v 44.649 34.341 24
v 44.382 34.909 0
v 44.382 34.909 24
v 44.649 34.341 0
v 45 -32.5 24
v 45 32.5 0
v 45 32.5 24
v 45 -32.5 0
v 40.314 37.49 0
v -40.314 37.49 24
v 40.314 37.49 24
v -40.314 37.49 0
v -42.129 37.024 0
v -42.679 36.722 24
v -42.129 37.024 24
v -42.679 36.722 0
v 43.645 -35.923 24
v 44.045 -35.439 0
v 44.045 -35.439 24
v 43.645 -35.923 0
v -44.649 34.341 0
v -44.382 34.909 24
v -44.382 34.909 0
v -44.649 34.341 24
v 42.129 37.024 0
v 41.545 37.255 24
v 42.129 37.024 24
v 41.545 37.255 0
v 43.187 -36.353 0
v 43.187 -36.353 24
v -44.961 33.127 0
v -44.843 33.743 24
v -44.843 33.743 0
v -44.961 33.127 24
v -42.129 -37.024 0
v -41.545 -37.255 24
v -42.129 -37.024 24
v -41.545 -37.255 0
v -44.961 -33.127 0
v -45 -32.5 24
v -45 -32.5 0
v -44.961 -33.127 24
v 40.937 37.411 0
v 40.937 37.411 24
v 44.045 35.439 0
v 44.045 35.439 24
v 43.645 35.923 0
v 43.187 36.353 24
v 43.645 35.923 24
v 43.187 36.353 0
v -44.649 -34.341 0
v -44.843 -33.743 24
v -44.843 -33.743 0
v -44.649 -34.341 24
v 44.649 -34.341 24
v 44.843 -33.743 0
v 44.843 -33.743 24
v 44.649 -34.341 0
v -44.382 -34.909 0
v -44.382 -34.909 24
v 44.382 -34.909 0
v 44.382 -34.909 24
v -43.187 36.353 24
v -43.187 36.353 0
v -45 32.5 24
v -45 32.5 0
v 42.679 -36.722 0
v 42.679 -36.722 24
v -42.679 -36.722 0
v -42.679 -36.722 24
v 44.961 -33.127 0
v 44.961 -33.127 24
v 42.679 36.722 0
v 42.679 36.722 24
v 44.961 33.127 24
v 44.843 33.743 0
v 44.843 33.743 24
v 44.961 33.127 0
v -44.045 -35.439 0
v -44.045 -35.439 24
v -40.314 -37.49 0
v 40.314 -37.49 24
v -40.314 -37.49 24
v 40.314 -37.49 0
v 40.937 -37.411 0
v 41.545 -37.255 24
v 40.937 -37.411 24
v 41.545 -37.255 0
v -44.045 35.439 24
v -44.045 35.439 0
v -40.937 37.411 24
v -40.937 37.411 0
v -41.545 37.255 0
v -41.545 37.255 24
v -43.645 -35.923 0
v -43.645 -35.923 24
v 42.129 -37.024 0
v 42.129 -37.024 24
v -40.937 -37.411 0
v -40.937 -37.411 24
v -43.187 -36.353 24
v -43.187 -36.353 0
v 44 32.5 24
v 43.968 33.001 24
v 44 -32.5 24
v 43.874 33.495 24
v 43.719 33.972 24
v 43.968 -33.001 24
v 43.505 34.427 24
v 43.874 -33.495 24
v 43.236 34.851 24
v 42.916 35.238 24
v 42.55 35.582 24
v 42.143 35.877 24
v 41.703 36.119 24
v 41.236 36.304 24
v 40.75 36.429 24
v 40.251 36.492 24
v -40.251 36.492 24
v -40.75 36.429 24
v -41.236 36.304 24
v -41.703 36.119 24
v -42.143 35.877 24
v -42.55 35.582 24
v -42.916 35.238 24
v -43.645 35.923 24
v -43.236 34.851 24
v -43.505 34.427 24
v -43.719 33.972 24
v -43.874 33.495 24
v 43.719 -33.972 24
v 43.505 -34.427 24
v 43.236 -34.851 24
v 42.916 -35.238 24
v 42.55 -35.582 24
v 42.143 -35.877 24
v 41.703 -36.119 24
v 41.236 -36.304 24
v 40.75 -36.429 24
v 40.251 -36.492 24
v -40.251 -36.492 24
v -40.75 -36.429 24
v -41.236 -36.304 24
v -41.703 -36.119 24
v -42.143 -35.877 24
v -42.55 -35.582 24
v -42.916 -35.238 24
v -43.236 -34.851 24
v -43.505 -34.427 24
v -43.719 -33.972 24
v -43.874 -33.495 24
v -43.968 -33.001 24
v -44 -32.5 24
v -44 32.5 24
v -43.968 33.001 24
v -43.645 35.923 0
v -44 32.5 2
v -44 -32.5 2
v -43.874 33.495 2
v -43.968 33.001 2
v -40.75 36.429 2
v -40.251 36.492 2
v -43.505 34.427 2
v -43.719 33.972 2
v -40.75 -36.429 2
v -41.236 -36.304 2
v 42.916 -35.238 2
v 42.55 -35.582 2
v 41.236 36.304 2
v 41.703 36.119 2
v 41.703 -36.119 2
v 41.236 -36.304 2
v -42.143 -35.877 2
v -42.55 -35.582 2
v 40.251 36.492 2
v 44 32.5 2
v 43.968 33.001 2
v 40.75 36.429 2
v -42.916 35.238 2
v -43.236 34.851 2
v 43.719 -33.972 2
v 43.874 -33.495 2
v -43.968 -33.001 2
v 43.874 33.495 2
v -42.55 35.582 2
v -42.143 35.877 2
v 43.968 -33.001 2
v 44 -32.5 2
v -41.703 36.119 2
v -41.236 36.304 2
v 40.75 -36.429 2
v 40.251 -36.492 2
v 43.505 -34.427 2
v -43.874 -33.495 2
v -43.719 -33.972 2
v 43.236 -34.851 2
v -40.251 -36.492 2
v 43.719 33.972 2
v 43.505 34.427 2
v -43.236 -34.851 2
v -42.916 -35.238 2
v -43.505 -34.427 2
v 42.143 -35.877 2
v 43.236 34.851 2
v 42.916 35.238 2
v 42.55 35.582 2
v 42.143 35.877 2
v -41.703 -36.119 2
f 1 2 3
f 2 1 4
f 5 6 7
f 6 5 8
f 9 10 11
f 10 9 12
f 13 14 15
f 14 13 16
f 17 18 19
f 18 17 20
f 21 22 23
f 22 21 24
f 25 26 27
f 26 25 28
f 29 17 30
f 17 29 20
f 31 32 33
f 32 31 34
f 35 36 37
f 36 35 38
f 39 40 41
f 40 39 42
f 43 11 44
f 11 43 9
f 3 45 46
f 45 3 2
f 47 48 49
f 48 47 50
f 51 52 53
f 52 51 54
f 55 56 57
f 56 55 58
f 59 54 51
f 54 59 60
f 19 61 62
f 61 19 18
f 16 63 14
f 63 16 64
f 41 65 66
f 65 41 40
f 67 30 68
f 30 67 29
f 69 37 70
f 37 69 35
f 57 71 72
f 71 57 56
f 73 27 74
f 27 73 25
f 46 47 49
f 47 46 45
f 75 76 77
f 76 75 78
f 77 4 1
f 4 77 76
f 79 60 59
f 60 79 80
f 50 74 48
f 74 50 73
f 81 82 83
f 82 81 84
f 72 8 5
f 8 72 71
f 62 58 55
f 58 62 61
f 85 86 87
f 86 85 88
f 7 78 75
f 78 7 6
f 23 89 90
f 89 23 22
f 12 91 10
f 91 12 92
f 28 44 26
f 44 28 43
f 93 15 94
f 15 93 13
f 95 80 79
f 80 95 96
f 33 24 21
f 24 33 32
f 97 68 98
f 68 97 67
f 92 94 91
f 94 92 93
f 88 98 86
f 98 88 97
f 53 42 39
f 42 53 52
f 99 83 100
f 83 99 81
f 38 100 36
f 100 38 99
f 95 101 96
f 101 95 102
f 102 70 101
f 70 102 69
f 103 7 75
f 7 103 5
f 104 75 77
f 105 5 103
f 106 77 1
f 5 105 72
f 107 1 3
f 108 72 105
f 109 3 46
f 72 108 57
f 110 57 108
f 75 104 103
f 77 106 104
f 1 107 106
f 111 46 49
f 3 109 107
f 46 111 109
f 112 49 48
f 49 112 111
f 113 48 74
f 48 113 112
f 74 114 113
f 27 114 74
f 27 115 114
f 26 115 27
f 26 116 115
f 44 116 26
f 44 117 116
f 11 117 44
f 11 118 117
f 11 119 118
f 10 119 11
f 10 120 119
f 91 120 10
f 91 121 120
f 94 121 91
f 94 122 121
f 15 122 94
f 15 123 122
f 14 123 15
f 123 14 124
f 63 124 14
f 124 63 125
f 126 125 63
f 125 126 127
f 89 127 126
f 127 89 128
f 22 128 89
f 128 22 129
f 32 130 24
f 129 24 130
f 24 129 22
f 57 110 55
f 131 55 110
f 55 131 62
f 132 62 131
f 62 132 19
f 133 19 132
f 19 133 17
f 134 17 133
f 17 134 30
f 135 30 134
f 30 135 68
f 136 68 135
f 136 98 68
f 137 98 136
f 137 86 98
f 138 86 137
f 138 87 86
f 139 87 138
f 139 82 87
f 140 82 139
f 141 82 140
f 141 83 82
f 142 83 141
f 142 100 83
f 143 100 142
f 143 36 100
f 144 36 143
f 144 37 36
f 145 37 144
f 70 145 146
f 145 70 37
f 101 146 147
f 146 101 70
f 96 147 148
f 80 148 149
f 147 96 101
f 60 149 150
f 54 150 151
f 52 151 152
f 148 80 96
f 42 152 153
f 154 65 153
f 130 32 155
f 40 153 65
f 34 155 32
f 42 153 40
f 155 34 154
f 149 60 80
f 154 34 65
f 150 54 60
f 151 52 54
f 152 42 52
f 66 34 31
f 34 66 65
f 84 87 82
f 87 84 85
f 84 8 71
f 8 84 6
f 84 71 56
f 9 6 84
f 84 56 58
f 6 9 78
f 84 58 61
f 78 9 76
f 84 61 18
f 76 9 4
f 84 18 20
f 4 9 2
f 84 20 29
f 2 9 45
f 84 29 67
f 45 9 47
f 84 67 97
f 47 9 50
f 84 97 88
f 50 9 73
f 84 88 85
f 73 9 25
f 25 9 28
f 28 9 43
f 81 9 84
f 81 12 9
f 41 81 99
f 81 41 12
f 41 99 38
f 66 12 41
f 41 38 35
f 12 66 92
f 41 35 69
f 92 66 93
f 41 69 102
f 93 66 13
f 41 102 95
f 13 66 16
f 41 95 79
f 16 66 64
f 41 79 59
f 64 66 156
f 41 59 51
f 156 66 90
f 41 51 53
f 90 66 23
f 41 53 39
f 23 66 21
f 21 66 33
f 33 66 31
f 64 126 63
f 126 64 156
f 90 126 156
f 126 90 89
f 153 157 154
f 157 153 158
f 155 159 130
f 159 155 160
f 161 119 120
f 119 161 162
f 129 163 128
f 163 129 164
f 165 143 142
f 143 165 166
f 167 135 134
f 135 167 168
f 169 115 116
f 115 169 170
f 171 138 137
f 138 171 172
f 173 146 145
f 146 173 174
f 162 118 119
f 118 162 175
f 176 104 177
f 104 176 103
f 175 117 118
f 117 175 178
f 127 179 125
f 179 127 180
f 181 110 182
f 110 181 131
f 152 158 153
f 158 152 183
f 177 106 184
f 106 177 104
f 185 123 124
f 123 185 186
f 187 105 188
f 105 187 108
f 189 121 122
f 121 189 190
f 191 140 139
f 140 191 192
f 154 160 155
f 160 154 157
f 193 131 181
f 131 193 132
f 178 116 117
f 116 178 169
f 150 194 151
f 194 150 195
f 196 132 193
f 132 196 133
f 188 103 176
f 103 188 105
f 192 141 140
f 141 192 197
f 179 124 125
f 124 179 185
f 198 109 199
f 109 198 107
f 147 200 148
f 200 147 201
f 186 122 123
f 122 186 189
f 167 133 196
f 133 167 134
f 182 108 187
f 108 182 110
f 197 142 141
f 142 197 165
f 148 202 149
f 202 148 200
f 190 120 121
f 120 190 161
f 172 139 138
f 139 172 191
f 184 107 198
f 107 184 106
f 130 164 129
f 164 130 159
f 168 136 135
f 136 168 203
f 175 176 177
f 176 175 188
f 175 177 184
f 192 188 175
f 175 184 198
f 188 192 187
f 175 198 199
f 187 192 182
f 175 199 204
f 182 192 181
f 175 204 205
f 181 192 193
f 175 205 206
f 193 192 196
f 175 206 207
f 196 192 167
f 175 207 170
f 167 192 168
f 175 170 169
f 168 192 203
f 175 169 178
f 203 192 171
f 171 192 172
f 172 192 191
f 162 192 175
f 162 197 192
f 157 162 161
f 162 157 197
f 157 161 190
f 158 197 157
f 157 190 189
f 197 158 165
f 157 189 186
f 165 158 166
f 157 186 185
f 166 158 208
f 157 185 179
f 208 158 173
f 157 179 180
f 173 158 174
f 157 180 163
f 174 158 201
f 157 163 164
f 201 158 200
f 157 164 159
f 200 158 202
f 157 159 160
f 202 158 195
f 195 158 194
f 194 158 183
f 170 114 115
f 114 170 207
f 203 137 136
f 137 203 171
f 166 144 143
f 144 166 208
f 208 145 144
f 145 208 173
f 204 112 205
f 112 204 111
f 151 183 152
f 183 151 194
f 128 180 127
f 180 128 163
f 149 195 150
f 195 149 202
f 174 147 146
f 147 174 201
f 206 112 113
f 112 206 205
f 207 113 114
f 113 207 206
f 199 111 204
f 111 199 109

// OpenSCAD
$fn = 50;


difference() {
	union() {
		hull() {
			translate(v = [-40.0000000000, 32.5000000000, 0]) {
				cylinder(h = 24, r = 5);
			}
			translate(v = [40.0000000000, 32.5000000000, 0]) {
				cylinder(h = 24, r = 5);
			}
			translate(v = [-40.0000000000, -32.5000000000, 0]) {
				cylinder(h = 24, r = 5);
			}
			translate(v = [40.0000000000, -32.5000000000, 0]) {
				cylinder(h = 24, r = 5);
			}
		}
	}
	union() {
		translate(v = [0, 0, 2]) {
			hull() {
				translate(v = [-40.0000000000, 32.5000000000, 0]) {
					cylinder(h = 22, r = 4);
				}
				translate(v = [40.0000000000, 32.5000000000, 0]) {
					cylinder(h = 22, r = 4);
				}
				translate(v = [-40.0000000000, -32.5000000000, 0]) {
					cylinder(h = 22, r = 4);
				}
				translate(v = [40.0000000000, -32.5000000000, 0]) {
					cylinder(h = 22, r = 4);
				}
			}
		}
	}
}
